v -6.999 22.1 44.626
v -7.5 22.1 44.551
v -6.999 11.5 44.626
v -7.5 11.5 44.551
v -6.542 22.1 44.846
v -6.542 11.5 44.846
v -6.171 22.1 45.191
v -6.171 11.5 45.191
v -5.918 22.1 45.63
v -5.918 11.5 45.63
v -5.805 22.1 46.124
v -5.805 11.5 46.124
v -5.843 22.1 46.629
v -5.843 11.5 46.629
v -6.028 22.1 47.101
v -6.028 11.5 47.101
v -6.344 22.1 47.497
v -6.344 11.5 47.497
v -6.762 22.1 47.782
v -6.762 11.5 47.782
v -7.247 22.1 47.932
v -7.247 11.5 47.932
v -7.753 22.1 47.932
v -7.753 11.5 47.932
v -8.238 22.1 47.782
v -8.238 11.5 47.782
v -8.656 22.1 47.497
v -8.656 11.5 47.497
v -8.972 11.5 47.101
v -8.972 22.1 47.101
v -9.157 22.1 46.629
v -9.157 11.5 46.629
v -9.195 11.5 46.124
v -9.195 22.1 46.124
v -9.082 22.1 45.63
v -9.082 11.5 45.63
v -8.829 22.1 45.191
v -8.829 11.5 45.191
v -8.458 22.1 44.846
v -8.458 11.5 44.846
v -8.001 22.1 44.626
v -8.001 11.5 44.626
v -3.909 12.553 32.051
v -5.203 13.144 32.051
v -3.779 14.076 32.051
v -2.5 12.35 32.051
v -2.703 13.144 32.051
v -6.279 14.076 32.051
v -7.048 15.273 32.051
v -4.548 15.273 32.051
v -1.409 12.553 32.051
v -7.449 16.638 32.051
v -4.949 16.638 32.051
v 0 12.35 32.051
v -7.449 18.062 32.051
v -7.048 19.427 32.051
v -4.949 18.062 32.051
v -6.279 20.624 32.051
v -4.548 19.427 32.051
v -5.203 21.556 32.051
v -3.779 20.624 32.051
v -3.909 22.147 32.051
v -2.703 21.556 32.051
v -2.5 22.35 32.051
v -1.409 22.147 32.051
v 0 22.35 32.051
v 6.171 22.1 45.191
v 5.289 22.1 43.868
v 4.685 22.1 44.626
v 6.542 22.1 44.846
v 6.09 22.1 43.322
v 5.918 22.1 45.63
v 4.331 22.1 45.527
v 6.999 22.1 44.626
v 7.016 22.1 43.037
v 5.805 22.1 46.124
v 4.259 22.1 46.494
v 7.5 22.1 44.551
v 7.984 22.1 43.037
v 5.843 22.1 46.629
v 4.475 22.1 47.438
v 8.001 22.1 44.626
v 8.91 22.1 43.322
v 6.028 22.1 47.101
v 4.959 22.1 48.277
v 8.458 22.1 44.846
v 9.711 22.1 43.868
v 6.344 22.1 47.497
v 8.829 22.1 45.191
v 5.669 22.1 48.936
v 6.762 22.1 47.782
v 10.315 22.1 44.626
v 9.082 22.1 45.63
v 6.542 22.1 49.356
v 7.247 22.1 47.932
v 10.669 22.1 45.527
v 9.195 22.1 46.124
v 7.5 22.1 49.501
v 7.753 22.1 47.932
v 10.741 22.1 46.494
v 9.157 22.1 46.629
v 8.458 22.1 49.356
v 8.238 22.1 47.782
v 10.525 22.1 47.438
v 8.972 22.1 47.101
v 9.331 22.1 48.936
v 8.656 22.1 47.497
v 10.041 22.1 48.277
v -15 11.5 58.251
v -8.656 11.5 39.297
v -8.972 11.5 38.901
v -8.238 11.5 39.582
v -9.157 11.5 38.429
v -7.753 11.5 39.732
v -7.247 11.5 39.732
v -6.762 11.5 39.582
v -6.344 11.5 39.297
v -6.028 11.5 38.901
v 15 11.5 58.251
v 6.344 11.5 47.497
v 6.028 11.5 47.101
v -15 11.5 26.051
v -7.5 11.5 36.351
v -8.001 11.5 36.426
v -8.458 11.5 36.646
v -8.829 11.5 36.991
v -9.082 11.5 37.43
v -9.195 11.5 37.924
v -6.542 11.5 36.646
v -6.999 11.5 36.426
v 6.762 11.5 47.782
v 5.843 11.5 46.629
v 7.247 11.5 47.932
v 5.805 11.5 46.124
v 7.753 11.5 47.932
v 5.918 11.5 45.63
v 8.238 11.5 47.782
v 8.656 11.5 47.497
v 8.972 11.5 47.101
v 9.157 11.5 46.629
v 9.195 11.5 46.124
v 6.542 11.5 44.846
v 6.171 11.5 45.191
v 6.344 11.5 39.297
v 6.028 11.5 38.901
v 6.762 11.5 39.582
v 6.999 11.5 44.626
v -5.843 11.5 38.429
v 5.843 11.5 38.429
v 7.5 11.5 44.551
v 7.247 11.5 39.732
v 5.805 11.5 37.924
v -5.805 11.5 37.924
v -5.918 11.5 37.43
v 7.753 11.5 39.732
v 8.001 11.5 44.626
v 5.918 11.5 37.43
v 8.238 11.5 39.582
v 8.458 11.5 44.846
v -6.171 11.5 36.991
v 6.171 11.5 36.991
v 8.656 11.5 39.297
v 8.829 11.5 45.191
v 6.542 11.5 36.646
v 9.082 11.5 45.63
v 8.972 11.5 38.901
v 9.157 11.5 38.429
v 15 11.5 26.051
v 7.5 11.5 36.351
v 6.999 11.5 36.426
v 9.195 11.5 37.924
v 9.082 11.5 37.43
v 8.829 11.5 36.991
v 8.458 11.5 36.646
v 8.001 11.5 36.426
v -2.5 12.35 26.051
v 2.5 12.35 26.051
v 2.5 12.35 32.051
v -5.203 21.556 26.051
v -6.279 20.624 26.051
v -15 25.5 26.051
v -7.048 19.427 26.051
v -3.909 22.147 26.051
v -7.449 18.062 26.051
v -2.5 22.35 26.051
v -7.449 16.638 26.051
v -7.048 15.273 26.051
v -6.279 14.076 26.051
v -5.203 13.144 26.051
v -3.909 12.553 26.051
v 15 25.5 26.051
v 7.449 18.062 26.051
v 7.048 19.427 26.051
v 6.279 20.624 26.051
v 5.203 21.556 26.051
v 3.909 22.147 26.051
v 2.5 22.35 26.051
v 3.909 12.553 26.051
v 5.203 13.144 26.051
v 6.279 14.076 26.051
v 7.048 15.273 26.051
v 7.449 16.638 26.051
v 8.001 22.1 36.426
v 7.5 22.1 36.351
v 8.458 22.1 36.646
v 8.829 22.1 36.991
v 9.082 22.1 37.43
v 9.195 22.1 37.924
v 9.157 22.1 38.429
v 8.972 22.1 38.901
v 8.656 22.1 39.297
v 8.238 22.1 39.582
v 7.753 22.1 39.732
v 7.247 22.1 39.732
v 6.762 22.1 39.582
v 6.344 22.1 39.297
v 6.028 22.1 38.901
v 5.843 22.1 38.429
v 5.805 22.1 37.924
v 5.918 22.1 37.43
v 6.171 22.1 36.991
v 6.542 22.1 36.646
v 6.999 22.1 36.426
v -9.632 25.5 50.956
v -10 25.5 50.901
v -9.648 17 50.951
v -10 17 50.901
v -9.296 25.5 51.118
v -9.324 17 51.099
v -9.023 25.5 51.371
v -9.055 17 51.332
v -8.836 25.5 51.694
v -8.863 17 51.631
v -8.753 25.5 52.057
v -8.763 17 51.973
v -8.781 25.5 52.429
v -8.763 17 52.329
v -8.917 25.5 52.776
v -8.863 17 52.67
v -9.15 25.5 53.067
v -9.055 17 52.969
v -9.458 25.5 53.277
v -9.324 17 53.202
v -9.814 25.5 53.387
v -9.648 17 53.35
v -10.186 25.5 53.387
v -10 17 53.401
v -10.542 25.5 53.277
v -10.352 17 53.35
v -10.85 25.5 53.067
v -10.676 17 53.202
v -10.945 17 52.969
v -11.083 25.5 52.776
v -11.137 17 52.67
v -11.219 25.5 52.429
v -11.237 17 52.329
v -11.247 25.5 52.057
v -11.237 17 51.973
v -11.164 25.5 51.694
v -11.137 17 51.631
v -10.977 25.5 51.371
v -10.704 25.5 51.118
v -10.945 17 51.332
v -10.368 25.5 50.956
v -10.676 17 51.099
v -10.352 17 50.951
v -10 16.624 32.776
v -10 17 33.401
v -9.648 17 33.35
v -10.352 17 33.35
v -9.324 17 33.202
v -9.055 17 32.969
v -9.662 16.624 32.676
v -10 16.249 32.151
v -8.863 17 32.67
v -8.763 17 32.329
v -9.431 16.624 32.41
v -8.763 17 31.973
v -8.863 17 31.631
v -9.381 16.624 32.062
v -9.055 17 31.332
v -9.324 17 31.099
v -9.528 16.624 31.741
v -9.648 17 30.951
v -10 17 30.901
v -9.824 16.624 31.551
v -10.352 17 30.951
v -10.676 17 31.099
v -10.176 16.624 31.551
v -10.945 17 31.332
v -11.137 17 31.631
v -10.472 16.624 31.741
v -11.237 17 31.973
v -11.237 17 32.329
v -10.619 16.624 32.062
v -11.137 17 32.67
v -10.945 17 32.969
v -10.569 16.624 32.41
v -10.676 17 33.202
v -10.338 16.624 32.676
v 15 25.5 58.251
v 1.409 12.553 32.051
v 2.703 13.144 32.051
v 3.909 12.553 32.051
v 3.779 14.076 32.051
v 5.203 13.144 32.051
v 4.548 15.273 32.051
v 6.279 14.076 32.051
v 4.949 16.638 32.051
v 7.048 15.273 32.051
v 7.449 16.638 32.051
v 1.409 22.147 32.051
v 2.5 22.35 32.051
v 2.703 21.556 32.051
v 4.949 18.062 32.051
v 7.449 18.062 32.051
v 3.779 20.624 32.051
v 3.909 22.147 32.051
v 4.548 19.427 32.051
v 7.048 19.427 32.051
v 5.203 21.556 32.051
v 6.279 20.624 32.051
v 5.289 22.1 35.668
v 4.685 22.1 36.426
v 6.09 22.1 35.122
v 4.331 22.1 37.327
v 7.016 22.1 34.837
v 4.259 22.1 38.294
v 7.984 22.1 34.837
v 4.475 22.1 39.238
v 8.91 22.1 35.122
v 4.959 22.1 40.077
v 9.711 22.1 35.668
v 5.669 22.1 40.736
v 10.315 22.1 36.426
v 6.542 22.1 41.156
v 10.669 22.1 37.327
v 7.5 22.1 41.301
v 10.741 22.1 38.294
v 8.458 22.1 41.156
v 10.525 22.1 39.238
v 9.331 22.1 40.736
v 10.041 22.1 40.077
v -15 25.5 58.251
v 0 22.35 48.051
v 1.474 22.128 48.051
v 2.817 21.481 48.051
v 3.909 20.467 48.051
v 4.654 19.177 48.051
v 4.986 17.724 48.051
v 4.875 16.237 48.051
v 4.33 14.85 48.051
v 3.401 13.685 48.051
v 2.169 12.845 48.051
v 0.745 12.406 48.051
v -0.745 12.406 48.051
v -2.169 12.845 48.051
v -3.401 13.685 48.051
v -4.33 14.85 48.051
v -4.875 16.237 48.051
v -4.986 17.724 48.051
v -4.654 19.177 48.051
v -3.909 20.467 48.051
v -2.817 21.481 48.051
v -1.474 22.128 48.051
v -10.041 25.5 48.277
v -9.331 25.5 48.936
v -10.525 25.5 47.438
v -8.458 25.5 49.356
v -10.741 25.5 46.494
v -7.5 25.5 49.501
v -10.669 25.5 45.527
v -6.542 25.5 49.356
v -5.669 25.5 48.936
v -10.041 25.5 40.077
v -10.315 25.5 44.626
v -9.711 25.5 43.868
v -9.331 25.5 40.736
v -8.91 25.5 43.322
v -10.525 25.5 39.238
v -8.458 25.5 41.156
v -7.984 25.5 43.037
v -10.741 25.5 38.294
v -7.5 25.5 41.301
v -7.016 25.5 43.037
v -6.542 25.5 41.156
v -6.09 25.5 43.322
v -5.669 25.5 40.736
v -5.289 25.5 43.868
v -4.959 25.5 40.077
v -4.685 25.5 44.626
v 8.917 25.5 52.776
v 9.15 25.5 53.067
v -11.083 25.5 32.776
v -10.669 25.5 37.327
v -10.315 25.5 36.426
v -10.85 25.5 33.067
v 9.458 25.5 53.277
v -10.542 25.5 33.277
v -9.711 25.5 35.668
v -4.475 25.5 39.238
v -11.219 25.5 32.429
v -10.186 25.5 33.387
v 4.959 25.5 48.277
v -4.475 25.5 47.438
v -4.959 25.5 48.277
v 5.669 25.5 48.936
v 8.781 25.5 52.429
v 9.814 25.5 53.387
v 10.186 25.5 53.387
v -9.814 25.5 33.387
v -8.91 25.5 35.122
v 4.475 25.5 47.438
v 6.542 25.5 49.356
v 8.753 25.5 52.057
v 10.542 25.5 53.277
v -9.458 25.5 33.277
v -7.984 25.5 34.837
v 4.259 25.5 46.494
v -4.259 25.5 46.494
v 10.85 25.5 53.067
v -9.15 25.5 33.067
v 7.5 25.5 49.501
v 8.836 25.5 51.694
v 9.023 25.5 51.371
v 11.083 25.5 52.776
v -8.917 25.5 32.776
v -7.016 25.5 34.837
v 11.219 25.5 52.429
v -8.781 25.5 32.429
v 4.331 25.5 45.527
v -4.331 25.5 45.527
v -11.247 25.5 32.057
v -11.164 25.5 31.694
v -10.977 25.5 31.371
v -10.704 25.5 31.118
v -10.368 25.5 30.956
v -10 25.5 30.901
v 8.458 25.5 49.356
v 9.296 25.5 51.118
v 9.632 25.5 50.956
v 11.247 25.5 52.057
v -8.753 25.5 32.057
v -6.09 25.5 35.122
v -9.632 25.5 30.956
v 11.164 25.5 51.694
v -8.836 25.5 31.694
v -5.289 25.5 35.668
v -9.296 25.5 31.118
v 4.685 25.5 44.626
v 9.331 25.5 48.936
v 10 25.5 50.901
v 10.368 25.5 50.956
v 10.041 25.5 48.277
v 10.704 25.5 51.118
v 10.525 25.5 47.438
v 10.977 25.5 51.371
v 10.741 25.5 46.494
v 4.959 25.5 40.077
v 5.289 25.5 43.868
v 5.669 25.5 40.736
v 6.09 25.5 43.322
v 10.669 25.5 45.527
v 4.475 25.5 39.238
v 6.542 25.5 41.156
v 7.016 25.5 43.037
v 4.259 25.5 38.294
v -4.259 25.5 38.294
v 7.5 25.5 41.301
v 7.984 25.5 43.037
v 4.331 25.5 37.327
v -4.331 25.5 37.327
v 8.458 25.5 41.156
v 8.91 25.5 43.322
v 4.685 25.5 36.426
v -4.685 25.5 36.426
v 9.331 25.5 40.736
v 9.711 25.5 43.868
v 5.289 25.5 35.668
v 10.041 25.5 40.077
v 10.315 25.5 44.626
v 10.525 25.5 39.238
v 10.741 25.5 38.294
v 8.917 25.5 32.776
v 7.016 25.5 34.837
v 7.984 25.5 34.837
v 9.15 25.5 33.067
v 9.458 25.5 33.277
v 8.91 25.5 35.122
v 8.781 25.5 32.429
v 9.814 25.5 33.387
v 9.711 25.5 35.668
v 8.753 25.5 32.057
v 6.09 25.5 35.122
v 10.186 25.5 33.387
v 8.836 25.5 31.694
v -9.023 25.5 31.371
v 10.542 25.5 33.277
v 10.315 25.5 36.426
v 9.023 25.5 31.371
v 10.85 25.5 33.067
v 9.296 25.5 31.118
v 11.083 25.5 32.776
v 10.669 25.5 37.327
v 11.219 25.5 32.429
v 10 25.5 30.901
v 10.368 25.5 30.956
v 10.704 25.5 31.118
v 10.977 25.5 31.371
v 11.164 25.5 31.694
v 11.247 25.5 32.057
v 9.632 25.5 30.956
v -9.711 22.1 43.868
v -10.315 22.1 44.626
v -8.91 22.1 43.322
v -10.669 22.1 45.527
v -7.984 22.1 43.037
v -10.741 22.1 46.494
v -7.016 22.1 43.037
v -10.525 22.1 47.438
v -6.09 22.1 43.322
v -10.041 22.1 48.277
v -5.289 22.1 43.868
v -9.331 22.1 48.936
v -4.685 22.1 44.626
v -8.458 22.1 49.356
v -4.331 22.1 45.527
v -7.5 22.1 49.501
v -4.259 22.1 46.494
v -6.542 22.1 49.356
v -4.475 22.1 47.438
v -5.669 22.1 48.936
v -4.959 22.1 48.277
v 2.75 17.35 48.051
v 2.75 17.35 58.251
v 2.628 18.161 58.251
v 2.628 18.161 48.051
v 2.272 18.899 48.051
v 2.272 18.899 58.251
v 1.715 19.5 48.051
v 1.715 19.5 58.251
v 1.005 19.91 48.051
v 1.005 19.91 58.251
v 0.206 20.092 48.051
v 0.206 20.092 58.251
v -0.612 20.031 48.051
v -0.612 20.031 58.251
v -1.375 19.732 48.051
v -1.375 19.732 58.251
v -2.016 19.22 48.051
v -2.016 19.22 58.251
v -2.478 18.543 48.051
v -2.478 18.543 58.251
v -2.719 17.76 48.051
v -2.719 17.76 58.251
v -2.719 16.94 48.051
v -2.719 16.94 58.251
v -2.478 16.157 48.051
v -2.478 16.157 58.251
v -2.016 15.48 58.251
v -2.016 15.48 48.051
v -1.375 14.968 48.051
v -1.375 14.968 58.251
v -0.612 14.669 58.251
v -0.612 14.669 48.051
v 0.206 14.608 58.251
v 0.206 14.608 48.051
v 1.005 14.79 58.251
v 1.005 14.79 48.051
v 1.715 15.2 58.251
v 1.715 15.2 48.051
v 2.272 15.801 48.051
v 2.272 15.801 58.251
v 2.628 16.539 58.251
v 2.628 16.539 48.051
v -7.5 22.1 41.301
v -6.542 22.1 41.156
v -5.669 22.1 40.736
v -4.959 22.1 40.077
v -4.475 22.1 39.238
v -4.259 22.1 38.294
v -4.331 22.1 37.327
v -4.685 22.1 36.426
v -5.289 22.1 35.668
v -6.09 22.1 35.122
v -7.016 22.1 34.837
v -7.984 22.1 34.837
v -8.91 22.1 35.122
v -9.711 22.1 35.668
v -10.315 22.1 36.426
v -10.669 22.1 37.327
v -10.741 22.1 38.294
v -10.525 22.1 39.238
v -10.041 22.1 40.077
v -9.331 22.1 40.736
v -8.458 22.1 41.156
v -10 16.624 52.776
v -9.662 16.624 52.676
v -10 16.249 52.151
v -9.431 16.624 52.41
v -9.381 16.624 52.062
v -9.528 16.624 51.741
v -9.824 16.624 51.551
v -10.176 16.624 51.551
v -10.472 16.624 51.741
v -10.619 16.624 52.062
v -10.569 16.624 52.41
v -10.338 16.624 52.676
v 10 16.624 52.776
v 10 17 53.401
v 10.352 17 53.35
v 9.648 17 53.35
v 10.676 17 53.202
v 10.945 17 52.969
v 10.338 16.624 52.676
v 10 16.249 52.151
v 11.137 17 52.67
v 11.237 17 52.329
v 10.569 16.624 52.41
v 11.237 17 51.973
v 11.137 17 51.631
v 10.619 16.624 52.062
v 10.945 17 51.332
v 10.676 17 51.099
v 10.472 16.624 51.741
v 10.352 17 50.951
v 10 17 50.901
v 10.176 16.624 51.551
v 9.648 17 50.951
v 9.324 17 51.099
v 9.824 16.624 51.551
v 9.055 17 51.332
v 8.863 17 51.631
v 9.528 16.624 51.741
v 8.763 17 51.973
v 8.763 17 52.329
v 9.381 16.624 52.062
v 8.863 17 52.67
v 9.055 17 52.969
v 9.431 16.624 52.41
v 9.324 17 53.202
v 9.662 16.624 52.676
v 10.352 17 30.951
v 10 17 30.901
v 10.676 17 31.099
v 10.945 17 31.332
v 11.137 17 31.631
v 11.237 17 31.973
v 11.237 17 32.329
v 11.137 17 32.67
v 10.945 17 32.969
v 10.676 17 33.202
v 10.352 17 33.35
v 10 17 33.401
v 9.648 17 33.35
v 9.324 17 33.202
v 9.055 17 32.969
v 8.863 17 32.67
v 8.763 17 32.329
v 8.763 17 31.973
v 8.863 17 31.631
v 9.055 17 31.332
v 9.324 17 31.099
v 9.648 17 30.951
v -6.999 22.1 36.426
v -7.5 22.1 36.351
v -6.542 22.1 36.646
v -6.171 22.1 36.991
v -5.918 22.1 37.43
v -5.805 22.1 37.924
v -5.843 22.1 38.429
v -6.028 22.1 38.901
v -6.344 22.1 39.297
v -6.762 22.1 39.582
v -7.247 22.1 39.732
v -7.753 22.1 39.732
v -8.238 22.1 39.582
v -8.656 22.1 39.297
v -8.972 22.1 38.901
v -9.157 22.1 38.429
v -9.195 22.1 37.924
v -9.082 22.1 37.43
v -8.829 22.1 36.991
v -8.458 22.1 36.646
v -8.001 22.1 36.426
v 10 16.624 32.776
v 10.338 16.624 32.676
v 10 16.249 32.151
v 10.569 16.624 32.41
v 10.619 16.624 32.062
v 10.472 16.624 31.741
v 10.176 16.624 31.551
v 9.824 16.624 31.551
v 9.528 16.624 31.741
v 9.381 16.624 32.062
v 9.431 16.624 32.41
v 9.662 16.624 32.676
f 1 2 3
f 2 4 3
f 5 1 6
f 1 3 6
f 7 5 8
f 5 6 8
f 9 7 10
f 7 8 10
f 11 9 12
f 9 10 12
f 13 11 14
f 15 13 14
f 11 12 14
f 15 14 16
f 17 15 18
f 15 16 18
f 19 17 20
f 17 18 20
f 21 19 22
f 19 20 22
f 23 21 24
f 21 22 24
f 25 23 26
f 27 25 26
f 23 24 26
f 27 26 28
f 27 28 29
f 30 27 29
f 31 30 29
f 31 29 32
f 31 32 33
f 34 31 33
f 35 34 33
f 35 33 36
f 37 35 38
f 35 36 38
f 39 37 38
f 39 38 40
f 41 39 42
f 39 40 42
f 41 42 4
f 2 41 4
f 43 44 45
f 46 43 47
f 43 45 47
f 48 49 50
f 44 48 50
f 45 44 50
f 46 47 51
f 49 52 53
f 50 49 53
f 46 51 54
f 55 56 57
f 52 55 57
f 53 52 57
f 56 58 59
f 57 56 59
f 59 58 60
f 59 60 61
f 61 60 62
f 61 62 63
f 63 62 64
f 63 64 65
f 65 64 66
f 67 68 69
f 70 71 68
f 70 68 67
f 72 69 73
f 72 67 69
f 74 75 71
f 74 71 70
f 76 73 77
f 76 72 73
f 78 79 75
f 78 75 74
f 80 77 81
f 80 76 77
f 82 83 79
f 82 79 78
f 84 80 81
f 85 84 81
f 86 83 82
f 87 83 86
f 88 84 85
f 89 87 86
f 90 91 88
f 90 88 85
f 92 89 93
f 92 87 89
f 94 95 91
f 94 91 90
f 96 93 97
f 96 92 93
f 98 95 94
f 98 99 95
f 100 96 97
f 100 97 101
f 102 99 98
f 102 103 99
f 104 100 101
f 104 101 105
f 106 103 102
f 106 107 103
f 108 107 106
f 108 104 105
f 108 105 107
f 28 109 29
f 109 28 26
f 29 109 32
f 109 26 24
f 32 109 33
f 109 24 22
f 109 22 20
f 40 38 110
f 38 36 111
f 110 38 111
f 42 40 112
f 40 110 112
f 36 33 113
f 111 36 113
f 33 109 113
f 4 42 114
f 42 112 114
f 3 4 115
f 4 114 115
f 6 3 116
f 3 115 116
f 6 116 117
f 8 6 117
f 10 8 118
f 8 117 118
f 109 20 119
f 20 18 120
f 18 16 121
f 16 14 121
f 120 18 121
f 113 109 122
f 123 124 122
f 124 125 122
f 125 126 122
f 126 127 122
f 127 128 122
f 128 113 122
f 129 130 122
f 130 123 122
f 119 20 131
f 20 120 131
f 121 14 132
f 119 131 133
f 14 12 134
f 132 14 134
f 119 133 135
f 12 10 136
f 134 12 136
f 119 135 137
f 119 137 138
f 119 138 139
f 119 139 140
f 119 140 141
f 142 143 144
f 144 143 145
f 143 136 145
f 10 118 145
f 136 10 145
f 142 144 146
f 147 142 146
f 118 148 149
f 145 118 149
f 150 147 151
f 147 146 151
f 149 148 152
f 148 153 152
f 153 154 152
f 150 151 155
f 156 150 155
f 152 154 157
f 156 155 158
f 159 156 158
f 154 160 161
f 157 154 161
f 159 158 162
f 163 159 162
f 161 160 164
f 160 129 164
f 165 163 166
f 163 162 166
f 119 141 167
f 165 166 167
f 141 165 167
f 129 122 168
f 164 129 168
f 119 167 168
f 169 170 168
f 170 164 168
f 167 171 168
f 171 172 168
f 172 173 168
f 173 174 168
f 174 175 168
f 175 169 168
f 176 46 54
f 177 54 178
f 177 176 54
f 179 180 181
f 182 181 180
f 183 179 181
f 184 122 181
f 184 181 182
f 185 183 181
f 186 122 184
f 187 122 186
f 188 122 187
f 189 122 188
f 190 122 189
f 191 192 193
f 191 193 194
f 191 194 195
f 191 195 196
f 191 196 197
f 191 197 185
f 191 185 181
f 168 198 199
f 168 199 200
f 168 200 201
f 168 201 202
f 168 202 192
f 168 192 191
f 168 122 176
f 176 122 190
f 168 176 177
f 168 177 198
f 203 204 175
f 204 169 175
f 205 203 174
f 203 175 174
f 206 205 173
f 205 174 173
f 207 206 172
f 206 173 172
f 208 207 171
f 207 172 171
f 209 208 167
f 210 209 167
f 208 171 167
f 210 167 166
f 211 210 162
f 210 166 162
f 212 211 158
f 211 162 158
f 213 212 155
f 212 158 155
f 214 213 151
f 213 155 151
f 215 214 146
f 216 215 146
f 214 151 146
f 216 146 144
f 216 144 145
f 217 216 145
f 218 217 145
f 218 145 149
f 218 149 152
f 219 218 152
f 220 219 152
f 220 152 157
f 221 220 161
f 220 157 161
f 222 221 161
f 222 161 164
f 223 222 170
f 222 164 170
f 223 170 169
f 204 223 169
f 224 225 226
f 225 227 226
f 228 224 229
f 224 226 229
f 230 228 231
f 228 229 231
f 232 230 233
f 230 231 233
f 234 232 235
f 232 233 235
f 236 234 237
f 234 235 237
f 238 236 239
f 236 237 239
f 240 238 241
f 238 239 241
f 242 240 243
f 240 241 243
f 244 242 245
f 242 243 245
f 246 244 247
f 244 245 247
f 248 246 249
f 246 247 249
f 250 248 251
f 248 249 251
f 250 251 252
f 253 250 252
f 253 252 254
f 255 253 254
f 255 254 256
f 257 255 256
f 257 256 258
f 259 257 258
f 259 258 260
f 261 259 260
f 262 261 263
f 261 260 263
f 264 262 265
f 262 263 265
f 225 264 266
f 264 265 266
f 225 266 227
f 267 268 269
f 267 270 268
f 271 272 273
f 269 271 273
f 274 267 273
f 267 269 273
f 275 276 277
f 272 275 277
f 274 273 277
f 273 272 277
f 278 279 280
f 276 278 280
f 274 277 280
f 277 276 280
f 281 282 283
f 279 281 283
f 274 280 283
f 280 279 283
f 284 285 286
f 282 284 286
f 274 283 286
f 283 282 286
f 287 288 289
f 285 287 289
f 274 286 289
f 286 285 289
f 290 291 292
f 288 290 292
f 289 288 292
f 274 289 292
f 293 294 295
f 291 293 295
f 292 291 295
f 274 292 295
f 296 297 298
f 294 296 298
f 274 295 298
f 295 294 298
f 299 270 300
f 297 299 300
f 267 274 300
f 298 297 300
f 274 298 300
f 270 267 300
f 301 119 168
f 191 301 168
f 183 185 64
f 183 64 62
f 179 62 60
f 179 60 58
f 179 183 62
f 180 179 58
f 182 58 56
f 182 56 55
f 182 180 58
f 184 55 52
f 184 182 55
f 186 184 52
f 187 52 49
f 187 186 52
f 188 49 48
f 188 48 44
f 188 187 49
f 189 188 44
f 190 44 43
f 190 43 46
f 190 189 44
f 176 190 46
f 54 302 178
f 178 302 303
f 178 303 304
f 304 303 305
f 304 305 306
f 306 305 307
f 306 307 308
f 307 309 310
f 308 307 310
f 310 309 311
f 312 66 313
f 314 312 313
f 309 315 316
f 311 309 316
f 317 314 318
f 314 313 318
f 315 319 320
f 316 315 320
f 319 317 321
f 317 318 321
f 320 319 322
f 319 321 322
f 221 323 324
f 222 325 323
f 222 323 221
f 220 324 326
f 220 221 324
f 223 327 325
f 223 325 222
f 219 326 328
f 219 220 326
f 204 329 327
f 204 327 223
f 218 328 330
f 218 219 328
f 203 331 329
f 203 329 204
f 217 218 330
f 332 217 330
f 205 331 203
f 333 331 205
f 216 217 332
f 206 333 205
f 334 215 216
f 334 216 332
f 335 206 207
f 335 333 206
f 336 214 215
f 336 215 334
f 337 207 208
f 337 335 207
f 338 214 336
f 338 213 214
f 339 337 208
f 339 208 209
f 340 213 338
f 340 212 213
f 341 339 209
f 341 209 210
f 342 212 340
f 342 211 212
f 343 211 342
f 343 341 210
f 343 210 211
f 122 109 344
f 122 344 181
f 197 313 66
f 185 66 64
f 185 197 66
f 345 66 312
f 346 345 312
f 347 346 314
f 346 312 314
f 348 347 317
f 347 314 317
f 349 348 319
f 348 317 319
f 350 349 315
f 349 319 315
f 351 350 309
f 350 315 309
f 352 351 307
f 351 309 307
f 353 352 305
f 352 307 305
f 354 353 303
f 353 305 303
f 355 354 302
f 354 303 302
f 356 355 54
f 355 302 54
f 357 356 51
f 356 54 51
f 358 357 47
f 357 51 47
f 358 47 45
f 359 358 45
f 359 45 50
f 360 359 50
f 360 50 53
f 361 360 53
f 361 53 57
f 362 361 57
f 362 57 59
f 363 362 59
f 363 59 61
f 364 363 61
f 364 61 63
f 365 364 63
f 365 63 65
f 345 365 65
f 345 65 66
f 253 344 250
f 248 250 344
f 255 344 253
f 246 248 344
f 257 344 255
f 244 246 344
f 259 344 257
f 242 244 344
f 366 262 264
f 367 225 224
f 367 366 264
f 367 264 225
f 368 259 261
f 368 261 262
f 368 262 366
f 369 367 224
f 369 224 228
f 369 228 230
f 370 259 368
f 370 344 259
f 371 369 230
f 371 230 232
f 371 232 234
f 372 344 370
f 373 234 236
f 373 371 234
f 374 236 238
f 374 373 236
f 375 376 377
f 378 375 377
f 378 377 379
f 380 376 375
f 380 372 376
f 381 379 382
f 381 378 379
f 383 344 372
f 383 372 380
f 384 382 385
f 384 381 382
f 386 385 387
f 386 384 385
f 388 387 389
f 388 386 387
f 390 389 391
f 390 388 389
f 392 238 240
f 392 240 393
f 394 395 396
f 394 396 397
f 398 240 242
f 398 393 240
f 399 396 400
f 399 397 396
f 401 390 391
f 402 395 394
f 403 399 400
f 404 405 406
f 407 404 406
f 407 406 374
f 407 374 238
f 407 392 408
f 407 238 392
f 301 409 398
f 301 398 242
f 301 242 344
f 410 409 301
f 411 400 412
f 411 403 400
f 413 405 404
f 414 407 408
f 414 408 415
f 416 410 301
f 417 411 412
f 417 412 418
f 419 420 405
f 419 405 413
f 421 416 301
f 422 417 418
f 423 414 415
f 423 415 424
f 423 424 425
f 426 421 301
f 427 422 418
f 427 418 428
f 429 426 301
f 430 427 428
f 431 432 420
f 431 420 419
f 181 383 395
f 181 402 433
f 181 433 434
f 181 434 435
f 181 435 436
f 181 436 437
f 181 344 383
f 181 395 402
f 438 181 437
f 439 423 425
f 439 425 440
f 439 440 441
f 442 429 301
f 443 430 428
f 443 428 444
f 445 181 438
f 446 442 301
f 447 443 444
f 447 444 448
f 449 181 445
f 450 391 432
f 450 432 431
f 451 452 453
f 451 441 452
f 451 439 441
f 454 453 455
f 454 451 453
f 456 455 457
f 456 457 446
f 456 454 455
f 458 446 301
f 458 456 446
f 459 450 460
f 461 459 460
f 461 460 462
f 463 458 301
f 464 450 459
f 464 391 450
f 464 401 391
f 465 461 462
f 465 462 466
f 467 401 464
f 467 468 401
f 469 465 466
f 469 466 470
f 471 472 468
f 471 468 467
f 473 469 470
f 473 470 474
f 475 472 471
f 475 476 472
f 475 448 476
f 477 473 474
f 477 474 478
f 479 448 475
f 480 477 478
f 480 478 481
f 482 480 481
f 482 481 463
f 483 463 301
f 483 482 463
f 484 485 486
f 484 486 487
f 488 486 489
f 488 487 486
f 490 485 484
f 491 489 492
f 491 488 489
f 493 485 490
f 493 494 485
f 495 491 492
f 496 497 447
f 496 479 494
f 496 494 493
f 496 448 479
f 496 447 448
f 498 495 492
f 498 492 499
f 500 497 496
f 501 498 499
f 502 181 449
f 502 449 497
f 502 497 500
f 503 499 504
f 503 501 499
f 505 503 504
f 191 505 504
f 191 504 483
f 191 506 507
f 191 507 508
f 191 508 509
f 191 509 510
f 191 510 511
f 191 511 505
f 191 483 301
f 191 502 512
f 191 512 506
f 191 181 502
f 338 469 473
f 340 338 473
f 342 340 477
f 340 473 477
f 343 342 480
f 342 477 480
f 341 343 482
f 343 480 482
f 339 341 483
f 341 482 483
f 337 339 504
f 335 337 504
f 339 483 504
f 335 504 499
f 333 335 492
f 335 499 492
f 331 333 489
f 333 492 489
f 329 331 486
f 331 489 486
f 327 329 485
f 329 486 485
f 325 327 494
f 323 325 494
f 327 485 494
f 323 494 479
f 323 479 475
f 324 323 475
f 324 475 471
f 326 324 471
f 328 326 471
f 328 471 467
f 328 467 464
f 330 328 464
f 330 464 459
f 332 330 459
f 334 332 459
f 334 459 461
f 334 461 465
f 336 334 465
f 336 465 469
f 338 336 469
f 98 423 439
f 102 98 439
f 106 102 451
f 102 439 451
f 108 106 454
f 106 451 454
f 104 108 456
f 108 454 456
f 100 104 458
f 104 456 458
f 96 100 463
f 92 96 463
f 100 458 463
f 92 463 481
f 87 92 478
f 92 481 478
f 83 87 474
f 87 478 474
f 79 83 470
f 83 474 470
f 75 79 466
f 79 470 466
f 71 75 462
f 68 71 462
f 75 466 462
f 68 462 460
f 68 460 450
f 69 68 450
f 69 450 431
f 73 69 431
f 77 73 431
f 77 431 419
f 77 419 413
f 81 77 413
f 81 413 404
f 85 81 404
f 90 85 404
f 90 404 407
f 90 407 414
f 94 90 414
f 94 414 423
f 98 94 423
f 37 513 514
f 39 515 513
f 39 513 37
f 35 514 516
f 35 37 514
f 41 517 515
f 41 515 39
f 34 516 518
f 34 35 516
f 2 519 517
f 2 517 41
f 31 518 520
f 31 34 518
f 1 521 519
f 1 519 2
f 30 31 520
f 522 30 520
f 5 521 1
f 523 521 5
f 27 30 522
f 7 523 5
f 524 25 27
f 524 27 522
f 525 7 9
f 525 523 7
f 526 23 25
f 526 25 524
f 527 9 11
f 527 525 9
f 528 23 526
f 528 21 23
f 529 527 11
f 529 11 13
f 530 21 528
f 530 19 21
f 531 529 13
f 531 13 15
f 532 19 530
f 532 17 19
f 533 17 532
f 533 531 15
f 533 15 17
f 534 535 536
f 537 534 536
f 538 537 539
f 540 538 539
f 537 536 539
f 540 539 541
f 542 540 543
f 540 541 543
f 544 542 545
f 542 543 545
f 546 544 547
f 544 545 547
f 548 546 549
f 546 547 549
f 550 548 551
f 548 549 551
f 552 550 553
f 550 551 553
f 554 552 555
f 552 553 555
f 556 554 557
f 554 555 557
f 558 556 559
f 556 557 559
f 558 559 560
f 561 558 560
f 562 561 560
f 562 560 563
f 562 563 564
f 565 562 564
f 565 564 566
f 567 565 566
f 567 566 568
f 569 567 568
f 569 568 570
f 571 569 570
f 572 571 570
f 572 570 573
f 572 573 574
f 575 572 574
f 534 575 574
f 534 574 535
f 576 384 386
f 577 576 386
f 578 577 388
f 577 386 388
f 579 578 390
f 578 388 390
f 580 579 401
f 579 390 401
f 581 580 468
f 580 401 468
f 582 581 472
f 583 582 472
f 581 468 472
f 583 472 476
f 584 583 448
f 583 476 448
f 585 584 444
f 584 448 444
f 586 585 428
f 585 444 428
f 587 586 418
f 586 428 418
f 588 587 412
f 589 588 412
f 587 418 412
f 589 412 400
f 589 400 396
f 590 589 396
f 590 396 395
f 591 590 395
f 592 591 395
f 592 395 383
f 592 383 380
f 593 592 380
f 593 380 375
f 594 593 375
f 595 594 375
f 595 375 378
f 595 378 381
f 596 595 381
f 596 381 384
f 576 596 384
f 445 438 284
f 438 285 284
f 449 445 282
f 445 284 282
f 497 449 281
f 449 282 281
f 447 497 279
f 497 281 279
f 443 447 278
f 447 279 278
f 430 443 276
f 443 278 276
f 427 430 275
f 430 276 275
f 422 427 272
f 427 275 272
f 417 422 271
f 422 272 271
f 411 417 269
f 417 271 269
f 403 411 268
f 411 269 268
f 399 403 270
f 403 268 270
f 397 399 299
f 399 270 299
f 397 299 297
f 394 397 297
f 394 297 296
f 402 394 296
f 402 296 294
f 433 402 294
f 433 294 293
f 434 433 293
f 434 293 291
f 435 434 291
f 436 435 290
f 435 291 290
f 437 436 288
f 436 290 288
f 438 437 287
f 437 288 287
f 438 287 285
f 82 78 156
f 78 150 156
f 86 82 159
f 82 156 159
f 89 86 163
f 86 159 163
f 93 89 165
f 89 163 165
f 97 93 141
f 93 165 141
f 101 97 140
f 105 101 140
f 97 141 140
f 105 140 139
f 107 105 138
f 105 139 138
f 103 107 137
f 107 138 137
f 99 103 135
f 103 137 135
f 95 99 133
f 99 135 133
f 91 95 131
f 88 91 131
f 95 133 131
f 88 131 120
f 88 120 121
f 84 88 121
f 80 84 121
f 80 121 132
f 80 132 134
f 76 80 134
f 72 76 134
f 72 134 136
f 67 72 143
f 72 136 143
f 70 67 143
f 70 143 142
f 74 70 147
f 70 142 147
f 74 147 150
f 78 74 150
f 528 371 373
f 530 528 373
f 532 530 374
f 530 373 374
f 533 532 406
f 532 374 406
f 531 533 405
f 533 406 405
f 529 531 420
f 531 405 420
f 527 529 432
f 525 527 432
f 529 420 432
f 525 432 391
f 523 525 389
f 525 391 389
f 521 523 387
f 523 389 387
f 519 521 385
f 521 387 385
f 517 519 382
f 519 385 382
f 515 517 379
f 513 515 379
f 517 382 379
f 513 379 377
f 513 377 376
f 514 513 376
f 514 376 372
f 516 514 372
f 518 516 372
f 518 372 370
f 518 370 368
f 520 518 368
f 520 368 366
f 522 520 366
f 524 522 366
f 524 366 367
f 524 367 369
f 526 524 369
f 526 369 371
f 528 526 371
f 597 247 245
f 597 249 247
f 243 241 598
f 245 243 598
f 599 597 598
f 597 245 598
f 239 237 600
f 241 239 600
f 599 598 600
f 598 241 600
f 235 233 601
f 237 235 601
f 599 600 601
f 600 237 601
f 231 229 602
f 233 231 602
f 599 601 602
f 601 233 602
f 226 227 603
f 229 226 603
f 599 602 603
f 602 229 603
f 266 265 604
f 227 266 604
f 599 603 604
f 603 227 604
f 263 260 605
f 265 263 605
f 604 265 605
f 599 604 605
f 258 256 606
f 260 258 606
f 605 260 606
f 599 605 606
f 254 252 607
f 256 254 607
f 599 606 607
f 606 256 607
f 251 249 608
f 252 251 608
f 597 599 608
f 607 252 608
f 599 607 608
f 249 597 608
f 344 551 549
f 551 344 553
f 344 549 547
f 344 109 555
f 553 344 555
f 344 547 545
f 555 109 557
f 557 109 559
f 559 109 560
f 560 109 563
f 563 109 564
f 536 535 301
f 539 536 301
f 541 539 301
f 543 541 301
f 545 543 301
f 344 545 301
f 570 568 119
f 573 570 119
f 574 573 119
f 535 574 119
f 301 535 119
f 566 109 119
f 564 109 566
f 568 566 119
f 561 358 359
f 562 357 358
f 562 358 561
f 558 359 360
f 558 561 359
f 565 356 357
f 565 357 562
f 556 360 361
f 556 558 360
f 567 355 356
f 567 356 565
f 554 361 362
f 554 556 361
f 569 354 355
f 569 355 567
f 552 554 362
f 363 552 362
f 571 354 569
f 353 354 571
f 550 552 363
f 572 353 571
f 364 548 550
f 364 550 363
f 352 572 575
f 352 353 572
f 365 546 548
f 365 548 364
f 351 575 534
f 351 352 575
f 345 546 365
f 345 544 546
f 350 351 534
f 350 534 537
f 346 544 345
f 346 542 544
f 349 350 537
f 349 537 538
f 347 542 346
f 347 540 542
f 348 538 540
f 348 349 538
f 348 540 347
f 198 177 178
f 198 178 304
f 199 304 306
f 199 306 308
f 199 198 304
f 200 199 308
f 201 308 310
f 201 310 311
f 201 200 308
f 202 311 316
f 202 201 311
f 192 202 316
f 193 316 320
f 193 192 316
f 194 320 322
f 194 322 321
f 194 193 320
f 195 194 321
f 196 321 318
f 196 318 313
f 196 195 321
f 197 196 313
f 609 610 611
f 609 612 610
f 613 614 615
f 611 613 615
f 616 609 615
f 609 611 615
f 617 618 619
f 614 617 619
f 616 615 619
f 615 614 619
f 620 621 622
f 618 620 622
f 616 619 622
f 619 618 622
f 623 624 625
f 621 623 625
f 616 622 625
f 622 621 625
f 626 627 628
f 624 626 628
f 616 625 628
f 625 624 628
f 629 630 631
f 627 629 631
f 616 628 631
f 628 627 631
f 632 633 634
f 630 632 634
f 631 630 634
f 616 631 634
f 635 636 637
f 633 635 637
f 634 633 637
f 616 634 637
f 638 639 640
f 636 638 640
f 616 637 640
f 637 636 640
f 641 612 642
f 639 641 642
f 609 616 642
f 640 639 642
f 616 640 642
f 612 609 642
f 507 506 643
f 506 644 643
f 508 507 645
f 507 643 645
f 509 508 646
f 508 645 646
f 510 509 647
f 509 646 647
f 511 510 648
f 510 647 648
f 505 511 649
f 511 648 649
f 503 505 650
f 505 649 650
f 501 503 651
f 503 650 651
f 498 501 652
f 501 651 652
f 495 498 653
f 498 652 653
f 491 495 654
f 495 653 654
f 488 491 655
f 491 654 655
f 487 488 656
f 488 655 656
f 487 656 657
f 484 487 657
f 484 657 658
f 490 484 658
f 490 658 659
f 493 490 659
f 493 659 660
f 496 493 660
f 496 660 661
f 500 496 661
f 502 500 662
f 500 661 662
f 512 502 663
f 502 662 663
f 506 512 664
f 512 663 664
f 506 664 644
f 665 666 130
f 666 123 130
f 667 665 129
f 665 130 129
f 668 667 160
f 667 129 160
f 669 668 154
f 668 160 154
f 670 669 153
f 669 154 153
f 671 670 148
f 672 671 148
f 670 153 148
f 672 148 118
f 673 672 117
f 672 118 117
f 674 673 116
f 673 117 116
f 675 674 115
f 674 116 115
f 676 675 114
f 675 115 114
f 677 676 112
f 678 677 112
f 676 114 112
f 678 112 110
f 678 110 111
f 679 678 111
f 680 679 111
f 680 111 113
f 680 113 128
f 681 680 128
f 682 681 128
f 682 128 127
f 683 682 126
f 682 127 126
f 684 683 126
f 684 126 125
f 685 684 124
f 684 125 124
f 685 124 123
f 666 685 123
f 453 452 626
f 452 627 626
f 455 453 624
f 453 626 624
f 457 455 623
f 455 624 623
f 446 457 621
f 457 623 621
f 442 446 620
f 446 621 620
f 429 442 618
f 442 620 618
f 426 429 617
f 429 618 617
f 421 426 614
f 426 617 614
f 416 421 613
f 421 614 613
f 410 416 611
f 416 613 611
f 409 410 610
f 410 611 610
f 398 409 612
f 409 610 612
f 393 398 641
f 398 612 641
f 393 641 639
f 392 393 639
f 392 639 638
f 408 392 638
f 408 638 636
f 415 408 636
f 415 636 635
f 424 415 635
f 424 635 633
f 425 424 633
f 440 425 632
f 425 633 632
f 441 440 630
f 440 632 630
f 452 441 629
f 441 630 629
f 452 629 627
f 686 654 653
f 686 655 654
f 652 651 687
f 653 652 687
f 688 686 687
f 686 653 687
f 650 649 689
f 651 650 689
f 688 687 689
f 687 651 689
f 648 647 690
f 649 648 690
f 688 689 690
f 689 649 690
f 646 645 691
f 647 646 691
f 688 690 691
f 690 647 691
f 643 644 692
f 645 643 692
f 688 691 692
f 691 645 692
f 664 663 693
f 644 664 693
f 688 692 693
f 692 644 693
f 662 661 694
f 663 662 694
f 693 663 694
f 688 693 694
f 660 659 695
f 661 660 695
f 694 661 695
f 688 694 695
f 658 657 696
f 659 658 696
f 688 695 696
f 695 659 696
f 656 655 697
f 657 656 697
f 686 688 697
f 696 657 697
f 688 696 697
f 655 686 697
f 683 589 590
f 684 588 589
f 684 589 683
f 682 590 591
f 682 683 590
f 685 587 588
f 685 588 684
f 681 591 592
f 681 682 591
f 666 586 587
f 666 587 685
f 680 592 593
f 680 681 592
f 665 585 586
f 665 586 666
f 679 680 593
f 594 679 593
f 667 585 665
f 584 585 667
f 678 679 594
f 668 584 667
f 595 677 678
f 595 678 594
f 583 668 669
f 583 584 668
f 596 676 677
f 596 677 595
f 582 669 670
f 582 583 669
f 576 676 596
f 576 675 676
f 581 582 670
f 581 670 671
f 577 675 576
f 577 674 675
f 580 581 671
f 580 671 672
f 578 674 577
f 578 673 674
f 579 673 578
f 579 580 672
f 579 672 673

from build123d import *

# Parameters (mm, degrees)
SKETCH_1_W             = 30
SKETCH_1_H             = 32.2
BODY_DEPTH             = 14
FIXTURE_M3_D           = 3.4
FIXTURE_M3_DEPTH       = 14
FIXTURE_M3_CBORE_D     = 6.5
FIXTURE_M3_CBORE_DEPTH = 3.4
FIXTURE_M3_TIP         = 1.021463052
FIXTURE_M3_1_D         = 2.5
FIXTURE_M3_1_DEPTH     = 8.5
FIXTURE_M3_1_TIP       = 0.751075774
SKETCH_6_R             = 2.75
HOLE_DEPTH             = 32.2
OVAL_DEPTH             = 6
SKETCH_8_R             = 5
HOLE2_DEPTH            = 22


with BuildPart() as part:
    # Эскиз1 → Body (new body)
    with BuildSketch(Plane(origin=(0, 11.5, 0), x_dir=(1, 0, 0), z_dir=(0, 1, 0))):
        with Locations((0, -42.150641757)):
            Rectangle(SKETCH_1_W, SKETCH_1_H)
    extrude(amount=BODY_DEPTH)

    # Fixture M3
    with Locations(Plane(origin=(-7.5, 25.5, 38.050641757), x_dir=(0, 0, 1), z_dir=(0, 1, 0))):
        with Locations((0, 0), (8.2, 0), (0, 15), (8.2, 15)):
            CounterBoreHole(FIXTURE_M3_D / 2, FIXTURE_M3_CBORE_D / 2, FIXTURE_M3_CBORE_DEPTH, depth=FIXTURE_M3_DEPTH)
            with Locations((0, 0, -(FIXTURE_M3_DEPTH + FIXTURE_M3_TIP / 2))):  # 118° drill point
                Cone(0, FIXTURE_M3_D / 2, FIXTURE_M3_TIP, mode=Mode.SUBTRACT)

    # Fixture M3_1
    with Locations(Plane(origin=(-10, 25.5, 32.150641757), x_dir=(0, 0, 1), z_dir=(0, 1, 0))):
        with Locations((0, 0), (0, 20), (20, 20), (20, 0)):
            Hole(FIXTURE_M3_1_D / 2, depth=FIXTURE_M3_1_DEPTH)
            with Locations((0, 0, -(FIXTURE_M3_1_DEPTH + FIXTURE_M3_1_TIP / 2))):  # 118° drill point
                Cone(0, FIXTURE_M3_1_D / 2, FIXTURE_M3_1_TIP, mode=Mode.SUBTRACT)

    # Эскиз6 → Hole (cut)
    with BuildSketch(Plane.XY.offset(58.250641757)):
        with Locations((0, 17.35)):
            Circle(SKETCH_6_R)
    extrude(amount=-HOLE_DEPTH, mode=Mode.SUBTRACT)

    # Эскиз7 → Oval (cut)
    with BuildSketch(Plane(origin=(0, 0, 26.050641757), x_dir=(-1, 0, 0), z_dir=(0, 0, -1))):
        with BuildLine():
            Line((-2.5, 22.35), (2.5, 22.35))
            ThreePointArc((2.5, 22.35), (7.5, 17.35), (2.5, 12.35))
            Line((2.5, 12.35), (-2.5, 12.35))
            ThreePointArc((-2.5, 12.35), (-7.5, 17.35), (-2.5, 22.35))
        make_face()
    extrude(amount=-OVAL_DEPTH, mode=Mode.SUBTRACT)

    # Эскиз8 → Hole2 (cut)
    with BuildSketch(Plane(origin=(0, 0, 26.050641757), x_dir=(-1, 0, 0), z_dir=(0, 0, -1))):
        with Locations(Location((0, 17.35, 0), (0, 0, 90))):
            Circle(SKETCH_8_R)
    extrude(amount=-HOLE2_DEPTH, mode=Mode.SUBTRACT)


solid = part.part
